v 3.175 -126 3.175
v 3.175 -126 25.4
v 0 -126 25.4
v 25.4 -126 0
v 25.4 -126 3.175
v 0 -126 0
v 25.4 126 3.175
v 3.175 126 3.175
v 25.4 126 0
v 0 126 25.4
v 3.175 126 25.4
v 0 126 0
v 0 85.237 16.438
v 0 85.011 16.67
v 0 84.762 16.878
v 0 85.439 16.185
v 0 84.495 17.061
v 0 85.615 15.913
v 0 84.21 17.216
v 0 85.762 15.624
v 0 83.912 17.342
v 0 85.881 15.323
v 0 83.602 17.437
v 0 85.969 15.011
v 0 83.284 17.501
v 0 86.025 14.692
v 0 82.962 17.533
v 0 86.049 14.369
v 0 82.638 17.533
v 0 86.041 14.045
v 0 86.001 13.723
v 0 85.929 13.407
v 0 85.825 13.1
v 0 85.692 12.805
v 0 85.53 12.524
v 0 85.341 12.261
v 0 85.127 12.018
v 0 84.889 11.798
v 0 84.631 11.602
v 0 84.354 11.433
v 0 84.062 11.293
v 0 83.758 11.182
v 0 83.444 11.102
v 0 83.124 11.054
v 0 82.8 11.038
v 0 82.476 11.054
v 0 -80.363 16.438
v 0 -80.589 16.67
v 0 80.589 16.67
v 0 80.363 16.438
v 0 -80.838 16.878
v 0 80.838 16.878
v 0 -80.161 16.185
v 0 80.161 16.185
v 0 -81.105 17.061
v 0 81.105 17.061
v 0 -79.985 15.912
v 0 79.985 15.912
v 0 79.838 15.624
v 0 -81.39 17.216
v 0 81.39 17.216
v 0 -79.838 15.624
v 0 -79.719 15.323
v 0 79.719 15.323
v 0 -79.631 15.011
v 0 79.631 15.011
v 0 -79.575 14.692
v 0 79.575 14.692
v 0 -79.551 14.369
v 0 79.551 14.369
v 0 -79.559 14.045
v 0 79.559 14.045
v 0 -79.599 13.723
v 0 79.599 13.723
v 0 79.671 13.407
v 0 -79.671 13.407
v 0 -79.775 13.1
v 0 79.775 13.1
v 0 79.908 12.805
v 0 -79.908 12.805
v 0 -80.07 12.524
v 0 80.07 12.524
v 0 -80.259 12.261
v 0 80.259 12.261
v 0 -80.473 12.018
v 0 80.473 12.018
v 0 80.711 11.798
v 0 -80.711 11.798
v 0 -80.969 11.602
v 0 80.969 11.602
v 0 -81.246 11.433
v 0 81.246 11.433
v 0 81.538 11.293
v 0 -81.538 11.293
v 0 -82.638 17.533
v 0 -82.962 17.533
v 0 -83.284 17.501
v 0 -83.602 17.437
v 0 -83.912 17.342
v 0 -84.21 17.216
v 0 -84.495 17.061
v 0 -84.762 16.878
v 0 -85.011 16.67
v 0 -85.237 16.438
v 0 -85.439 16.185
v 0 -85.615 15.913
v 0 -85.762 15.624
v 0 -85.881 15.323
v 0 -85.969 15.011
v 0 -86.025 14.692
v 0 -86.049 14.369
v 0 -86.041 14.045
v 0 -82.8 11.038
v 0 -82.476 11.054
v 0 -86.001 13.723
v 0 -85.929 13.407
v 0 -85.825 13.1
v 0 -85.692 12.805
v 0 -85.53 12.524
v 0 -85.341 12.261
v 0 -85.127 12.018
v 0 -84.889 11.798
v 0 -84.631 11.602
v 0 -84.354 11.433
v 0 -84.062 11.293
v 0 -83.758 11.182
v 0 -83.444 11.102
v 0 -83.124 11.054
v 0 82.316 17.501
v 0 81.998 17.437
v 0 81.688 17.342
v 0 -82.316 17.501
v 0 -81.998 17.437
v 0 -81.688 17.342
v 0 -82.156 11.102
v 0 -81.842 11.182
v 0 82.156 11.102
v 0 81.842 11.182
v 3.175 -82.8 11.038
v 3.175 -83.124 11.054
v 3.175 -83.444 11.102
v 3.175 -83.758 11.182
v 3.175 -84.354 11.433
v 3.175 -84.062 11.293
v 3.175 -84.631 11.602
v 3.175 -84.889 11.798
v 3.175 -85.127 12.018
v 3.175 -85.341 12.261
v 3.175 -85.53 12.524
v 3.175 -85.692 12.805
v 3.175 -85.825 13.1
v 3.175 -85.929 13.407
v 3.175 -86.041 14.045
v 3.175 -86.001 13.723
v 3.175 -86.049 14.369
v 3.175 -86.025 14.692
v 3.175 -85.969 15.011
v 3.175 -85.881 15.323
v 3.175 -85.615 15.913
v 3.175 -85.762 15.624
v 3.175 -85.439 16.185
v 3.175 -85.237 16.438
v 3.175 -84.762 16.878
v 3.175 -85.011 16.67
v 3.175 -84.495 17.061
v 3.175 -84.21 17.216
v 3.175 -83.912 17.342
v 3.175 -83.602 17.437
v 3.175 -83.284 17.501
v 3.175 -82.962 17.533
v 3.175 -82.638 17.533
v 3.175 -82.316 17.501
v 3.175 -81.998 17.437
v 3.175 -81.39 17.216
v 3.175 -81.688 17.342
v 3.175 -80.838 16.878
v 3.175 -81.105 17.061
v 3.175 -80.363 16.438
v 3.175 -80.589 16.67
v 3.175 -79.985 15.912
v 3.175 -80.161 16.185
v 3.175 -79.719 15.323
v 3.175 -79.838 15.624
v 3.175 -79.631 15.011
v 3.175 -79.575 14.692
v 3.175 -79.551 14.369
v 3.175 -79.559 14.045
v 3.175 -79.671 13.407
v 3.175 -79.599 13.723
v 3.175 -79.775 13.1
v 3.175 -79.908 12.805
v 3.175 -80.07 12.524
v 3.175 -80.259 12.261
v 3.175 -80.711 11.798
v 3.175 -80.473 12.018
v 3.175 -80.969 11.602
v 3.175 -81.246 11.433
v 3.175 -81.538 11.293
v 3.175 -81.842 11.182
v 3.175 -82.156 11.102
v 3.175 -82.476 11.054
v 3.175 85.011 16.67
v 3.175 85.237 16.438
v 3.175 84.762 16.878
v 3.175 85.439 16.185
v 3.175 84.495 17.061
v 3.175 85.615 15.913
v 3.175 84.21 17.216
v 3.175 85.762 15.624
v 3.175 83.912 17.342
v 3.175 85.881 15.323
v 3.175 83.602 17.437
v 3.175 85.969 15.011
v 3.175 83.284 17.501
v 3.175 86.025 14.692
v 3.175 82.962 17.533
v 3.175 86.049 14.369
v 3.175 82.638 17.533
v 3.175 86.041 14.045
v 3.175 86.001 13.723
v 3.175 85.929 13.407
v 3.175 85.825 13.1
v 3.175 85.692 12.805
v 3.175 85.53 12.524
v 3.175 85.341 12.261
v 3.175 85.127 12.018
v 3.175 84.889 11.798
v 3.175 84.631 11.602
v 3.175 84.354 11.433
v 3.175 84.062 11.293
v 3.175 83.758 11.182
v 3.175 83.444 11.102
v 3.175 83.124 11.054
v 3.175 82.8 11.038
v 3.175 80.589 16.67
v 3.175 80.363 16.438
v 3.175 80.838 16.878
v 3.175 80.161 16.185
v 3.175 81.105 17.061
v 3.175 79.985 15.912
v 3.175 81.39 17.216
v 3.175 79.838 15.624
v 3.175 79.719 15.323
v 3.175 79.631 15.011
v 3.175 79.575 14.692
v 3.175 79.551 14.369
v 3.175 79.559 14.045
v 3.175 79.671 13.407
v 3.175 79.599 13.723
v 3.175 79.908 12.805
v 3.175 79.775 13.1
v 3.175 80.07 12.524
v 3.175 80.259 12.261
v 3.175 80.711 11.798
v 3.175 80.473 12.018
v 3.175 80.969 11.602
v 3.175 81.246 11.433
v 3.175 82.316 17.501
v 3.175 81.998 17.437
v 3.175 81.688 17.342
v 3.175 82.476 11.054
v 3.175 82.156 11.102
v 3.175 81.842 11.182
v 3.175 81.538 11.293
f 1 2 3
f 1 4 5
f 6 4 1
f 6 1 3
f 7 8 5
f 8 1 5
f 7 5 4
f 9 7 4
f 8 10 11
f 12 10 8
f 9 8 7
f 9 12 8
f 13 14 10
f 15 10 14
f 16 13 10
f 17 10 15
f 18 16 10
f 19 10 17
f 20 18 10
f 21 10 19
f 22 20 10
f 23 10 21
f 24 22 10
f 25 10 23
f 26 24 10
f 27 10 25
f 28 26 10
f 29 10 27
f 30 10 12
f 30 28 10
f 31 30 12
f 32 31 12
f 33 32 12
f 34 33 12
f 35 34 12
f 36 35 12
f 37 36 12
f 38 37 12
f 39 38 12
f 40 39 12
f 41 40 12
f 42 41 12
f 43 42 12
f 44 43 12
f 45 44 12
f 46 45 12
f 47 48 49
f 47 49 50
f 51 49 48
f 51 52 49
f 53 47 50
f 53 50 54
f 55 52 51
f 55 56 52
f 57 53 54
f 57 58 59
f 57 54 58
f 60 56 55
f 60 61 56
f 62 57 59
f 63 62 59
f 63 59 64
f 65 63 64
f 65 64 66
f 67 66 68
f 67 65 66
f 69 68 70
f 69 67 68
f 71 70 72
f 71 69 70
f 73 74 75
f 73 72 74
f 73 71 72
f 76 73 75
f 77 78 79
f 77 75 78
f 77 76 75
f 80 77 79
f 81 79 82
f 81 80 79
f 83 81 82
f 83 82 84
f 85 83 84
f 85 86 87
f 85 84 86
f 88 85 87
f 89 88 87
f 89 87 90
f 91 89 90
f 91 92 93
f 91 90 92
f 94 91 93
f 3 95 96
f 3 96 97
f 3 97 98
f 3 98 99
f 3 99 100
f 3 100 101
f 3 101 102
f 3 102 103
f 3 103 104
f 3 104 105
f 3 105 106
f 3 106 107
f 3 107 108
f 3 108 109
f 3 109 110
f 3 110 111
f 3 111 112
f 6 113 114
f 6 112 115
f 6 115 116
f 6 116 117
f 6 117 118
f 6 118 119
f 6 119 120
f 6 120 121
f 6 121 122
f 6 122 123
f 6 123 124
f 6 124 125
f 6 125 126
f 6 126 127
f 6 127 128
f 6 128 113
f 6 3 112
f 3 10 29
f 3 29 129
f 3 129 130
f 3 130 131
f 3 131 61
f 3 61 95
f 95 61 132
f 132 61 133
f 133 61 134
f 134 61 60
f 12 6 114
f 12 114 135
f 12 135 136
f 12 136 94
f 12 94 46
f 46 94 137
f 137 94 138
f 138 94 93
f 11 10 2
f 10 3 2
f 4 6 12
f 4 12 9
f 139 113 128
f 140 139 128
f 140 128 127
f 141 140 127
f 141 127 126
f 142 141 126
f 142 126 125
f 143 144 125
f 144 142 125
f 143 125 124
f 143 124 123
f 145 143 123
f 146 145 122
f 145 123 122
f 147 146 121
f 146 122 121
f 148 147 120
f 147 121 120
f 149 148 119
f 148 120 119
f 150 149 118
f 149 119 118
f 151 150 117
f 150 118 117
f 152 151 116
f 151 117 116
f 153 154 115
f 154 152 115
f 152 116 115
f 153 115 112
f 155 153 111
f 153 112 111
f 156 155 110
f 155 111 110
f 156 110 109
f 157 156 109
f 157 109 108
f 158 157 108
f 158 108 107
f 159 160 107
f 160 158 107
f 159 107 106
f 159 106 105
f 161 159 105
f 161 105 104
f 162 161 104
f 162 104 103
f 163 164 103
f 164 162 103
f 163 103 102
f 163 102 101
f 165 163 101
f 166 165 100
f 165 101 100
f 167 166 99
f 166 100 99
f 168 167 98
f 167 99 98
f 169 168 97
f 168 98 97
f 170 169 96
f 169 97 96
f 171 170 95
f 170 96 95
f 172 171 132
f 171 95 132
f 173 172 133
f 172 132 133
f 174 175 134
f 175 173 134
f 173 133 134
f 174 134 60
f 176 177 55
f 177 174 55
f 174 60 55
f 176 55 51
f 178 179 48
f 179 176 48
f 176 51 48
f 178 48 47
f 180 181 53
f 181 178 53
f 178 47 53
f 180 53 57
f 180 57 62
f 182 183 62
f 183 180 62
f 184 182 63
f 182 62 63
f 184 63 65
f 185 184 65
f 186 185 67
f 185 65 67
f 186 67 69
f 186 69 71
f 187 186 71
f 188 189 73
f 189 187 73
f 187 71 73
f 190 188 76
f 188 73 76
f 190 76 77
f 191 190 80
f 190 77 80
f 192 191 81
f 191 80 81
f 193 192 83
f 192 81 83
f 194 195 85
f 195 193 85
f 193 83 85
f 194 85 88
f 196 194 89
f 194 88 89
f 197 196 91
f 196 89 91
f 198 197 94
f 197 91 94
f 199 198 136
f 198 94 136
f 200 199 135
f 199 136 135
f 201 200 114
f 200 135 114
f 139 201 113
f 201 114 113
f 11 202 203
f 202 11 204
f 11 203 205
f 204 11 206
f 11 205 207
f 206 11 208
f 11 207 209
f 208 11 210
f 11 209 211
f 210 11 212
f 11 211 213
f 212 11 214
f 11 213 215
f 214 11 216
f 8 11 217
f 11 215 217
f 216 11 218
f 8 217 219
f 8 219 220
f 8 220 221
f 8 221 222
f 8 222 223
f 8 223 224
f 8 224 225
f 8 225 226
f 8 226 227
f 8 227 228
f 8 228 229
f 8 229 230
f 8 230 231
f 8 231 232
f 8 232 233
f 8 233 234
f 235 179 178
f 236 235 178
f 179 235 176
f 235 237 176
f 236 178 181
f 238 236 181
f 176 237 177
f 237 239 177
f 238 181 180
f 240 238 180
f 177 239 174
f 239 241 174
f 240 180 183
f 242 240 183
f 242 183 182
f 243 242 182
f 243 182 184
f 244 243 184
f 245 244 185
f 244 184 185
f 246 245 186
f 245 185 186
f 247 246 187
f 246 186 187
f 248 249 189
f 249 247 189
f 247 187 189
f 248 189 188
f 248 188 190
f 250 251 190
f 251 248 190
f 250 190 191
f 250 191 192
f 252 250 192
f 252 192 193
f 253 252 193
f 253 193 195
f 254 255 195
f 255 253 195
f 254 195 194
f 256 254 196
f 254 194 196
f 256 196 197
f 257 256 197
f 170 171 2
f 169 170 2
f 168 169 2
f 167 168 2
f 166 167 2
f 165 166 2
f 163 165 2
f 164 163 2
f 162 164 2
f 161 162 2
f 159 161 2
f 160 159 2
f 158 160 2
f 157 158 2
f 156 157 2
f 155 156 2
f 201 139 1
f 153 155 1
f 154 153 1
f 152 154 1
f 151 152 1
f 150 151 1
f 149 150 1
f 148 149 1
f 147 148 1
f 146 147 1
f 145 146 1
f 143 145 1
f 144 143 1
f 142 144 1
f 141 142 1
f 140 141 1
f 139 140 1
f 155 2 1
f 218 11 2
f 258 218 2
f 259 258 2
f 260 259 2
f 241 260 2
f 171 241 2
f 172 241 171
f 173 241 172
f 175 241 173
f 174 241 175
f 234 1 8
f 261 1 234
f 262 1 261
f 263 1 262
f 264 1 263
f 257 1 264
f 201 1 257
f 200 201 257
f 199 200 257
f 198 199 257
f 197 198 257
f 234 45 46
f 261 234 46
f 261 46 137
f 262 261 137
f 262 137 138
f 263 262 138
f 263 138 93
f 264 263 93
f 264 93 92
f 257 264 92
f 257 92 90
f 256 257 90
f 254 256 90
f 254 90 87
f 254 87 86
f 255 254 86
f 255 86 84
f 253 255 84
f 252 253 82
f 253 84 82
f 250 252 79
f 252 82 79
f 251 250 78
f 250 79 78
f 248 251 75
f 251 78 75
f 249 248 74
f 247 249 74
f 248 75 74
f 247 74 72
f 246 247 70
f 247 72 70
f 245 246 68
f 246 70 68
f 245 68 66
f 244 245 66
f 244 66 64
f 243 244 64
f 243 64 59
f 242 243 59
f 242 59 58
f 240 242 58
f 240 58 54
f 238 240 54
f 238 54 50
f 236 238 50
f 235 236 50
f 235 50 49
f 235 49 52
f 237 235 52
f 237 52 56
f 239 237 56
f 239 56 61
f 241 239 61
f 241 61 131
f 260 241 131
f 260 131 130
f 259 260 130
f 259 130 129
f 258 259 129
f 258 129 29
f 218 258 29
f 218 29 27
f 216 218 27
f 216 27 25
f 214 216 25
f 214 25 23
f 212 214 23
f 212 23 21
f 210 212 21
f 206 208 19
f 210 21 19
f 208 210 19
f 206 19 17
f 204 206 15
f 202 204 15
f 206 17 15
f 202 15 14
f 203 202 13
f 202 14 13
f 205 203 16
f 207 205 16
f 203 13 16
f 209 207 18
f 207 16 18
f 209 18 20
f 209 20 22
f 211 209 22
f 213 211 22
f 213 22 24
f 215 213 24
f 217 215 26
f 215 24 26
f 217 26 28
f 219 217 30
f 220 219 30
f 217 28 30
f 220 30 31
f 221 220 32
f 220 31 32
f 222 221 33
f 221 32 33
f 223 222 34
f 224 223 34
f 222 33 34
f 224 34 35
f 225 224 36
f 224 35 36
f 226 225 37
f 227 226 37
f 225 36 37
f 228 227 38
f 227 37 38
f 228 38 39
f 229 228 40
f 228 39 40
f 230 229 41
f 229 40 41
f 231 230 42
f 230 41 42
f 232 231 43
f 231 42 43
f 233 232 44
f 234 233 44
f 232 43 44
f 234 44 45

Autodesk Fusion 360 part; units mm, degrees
sketch "Sketch1" plane through (0, 0, 0) normal (0, 1, 0) x (1, 0, 0)
  line L0 (0, -25.4) -> (0, 0)
  line L1 (0, 0) -> (25.4, 0)
  line L2 (12.7, -12.7) -> (11.05, -11.05) construction
  line L3 (3.175, -25.4) -> (3.175, -3.175)
  line L4 (3.175, -3.175) -> (25.4, -3.175)
  line L5 (25.4, -3.175) -> (25.4, 0)
  line L6 (0, -25.4) -> (3.175, -25.4)
  dimension "d1" = 25.4
  dimension "d2" = 25.4
  dimension "d13" = 3.175
extrude "Extrude1" add sketch "Sketch1" along normal blind 126
hole "Hole3" at (3.175, 76, 14.2875) direction (-1, 0, 0) diameter 6.5 end through all
mirror "Mirror1" about plane through (0, 0, 0) normal (0, 1, 0) of bodies 1 merged
equation "d5 = ( 252 / 2 ) * 1 mm"
equation "d27 = ( 22.225 / 2 ) * 1 mm"
